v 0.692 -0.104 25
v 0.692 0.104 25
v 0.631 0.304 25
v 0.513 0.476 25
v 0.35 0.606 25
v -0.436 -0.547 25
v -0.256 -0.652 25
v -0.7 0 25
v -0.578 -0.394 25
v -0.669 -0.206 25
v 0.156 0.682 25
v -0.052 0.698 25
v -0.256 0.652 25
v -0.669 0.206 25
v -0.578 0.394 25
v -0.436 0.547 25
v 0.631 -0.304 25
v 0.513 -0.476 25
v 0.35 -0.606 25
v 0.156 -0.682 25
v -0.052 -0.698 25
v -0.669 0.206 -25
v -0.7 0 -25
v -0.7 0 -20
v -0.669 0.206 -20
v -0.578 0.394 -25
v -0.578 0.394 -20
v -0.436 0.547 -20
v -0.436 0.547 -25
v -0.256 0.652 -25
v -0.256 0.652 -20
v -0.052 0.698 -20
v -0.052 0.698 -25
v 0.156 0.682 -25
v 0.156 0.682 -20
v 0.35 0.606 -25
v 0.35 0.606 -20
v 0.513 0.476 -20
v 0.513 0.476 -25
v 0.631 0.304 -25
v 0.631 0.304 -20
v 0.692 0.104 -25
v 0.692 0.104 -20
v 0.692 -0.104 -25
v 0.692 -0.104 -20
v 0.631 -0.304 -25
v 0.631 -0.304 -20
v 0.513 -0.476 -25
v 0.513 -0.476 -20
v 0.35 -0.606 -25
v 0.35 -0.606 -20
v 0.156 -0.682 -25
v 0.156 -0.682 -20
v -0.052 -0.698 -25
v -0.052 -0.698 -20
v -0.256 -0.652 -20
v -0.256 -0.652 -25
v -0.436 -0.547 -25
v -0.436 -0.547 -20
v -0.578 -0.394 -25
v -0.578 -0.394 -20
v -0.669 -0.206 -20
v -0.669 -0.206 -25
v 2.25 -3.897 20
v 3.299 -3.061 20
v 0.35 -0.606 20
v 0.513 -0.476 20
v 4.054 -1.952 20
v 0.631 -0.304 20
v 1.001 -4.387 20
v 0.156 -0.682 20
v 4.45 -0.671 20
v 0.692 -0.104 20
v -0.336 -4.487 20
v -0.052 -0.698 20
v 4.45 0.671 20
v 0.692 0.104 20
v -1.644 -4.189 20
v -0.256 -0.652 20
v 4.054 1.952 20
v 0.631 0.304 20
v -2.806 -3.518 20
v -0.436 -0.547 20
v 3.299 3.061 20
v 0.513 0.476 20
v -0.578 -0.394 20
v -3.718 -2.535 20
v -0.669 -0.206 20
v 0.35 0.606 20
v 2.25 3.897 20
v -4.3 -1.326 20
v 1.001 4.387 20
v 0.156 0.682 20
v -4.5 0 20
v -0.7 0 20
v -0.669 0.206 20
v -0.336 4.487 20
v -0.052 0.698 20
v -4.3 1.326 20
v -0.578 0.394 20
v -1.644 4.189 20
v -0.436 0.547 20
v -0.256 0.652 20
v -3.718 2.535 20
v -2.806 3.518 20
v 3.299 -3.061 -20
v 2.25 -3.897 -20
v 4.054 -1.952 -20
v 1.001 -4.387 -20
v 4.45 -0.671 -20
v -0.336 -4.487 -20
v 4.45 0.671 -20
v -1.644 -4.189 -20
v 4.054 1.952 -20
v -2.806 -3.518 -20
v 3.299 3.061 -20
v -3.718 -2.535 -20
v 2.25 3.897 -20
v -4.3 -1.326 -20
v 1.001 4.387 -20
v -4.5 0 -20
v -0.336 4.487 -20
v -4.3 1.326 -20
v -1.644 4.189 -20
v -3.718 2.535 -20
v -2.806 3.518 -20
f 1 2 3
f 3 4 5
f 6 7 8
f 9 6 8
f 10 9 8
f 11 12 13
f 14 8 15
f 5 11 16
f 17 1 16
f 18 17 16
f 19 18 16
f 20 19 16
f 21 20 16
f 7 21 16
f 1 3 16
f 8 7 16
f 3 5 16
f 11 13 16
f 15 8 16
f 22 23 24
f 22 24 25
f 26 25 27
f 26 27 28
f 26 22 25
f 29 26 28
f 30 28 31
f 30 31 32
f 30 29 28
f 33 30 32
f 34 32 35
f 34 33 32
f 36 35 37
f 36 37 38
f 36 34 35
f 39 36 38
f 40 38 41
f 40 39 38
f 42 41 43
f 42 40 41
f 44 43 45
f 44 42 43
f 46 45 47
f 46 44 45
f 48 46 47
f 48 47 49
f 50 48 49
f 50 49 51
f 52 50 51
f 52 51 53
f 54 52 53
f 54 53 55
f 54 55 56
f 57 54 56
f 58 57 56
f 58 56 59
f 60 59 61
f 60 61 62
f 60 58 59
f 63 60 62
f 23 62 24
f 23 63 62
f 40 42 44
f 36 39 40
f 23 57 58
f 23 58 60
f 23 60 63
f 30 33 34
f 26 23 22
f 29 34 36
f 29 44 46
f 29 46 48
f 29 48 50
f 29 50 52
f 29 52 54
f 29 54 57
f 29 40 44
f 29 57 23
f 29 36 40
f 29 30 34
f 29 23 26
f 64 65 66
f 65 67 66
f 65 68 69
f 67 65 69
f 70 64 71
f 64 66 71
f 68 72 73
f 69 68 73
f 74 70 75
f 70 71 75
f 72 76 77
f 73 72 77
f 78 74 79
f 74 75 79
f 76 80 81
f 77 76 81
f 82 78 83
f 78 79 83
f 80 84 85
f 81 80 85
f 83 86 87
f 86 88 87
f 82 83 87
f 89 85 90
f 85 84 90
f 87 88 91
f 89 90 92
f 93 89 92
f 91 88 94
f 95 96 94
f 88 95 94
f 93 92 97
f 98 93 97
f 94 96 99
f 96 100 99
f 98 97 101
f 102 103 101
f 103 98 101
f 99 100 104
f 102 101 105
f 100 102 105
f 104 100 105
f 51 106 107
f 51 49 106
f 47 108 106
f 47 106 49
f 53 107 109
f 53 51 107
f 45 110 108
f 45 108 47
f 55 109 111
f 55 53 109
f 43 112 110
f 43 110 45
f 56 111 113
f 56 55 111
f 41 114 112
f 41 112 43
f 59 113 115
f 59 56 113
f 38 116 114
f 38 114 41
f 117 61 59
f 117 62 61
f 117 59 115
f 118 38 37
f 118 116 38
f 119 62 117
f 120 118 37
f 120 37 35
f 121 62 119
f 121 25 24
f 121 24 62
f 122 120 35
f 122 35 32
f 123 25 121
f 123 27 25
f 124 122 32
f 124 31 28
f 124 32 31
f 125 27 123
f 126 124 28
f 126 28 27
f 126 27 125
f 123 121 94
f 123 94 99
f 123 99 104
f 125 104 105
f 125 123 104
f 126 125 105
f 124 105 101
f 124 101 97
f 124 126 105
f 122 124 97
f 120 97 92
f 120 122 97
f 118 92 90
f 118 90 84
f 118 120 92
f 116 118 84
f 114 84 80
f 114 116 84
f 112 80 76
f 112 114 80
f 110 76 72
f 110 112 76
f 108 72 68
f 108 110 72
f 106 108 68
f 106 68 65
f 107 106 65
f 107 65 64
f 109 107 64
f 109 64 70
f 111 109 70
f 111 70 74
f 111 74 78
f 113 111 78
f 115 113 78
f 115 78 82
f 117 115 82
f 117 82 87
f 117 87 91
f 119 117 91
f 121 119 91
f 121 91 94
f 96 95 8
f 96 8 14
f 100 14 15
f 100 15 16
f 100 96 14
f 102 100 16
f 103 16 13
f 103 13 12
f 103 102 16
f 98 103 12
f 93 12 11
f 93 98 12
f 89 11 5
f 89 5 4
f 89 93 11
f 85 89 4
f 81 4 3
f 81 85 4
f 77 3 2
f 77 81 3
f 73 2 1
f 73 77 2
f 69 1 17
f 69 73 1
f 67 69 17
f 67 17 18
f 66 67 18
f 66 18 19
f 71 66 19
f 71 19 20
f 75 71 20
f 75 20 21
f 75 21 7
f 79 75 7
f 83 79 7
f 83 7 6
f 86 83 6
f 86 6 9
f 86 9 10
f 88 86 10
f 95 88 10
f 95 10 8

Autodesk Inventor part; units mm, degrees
ref_plane "YZ Plane" through (0, 0, 0) normal (1, 0, 0) x (0, 1, 0)
ref_plane "XZ Plane" through (0, 0, 0) normal (0, 1, 0) x (-1, 0, 0)
ref_plane "XY Plane" through (0, 0, 0) normal (0, 0, 1) x (1, 0, 0)
sketch "Sketch1" plane through (0, 0, 0) normal (0, 1, 0) x (-1, 0, 0)
  line L0 (0, 25) -> (0, -25)
  line L1 (0, 25) -> (0.7, 25)
  line L2 (0.7, 25) -> (0.7, 20)
  line L3 (0.7, 20) -> (4.5, 20)
  line L4 (4.5, 20) -> (4.5, -20)
  line L5 (4.5, -20) -> (0.7, -20)
  line L6 (0.7, -20) -> (0.7, -25)
  line L7 (0.7, -25) -> (0, -25)
  point P0 (0, 0)
  point P1 (0, 0)
  dimension "d0" = 9
  dimension "d1" = 1.4
  dimension "d2" = 5
  dimension "d3" = 40
revolve "Revolution1" add sketch "Sketch1" angle 360 about axis through (0, 0, 25) along (0, 0, -1)
properties part number "15kOhmResistor"
